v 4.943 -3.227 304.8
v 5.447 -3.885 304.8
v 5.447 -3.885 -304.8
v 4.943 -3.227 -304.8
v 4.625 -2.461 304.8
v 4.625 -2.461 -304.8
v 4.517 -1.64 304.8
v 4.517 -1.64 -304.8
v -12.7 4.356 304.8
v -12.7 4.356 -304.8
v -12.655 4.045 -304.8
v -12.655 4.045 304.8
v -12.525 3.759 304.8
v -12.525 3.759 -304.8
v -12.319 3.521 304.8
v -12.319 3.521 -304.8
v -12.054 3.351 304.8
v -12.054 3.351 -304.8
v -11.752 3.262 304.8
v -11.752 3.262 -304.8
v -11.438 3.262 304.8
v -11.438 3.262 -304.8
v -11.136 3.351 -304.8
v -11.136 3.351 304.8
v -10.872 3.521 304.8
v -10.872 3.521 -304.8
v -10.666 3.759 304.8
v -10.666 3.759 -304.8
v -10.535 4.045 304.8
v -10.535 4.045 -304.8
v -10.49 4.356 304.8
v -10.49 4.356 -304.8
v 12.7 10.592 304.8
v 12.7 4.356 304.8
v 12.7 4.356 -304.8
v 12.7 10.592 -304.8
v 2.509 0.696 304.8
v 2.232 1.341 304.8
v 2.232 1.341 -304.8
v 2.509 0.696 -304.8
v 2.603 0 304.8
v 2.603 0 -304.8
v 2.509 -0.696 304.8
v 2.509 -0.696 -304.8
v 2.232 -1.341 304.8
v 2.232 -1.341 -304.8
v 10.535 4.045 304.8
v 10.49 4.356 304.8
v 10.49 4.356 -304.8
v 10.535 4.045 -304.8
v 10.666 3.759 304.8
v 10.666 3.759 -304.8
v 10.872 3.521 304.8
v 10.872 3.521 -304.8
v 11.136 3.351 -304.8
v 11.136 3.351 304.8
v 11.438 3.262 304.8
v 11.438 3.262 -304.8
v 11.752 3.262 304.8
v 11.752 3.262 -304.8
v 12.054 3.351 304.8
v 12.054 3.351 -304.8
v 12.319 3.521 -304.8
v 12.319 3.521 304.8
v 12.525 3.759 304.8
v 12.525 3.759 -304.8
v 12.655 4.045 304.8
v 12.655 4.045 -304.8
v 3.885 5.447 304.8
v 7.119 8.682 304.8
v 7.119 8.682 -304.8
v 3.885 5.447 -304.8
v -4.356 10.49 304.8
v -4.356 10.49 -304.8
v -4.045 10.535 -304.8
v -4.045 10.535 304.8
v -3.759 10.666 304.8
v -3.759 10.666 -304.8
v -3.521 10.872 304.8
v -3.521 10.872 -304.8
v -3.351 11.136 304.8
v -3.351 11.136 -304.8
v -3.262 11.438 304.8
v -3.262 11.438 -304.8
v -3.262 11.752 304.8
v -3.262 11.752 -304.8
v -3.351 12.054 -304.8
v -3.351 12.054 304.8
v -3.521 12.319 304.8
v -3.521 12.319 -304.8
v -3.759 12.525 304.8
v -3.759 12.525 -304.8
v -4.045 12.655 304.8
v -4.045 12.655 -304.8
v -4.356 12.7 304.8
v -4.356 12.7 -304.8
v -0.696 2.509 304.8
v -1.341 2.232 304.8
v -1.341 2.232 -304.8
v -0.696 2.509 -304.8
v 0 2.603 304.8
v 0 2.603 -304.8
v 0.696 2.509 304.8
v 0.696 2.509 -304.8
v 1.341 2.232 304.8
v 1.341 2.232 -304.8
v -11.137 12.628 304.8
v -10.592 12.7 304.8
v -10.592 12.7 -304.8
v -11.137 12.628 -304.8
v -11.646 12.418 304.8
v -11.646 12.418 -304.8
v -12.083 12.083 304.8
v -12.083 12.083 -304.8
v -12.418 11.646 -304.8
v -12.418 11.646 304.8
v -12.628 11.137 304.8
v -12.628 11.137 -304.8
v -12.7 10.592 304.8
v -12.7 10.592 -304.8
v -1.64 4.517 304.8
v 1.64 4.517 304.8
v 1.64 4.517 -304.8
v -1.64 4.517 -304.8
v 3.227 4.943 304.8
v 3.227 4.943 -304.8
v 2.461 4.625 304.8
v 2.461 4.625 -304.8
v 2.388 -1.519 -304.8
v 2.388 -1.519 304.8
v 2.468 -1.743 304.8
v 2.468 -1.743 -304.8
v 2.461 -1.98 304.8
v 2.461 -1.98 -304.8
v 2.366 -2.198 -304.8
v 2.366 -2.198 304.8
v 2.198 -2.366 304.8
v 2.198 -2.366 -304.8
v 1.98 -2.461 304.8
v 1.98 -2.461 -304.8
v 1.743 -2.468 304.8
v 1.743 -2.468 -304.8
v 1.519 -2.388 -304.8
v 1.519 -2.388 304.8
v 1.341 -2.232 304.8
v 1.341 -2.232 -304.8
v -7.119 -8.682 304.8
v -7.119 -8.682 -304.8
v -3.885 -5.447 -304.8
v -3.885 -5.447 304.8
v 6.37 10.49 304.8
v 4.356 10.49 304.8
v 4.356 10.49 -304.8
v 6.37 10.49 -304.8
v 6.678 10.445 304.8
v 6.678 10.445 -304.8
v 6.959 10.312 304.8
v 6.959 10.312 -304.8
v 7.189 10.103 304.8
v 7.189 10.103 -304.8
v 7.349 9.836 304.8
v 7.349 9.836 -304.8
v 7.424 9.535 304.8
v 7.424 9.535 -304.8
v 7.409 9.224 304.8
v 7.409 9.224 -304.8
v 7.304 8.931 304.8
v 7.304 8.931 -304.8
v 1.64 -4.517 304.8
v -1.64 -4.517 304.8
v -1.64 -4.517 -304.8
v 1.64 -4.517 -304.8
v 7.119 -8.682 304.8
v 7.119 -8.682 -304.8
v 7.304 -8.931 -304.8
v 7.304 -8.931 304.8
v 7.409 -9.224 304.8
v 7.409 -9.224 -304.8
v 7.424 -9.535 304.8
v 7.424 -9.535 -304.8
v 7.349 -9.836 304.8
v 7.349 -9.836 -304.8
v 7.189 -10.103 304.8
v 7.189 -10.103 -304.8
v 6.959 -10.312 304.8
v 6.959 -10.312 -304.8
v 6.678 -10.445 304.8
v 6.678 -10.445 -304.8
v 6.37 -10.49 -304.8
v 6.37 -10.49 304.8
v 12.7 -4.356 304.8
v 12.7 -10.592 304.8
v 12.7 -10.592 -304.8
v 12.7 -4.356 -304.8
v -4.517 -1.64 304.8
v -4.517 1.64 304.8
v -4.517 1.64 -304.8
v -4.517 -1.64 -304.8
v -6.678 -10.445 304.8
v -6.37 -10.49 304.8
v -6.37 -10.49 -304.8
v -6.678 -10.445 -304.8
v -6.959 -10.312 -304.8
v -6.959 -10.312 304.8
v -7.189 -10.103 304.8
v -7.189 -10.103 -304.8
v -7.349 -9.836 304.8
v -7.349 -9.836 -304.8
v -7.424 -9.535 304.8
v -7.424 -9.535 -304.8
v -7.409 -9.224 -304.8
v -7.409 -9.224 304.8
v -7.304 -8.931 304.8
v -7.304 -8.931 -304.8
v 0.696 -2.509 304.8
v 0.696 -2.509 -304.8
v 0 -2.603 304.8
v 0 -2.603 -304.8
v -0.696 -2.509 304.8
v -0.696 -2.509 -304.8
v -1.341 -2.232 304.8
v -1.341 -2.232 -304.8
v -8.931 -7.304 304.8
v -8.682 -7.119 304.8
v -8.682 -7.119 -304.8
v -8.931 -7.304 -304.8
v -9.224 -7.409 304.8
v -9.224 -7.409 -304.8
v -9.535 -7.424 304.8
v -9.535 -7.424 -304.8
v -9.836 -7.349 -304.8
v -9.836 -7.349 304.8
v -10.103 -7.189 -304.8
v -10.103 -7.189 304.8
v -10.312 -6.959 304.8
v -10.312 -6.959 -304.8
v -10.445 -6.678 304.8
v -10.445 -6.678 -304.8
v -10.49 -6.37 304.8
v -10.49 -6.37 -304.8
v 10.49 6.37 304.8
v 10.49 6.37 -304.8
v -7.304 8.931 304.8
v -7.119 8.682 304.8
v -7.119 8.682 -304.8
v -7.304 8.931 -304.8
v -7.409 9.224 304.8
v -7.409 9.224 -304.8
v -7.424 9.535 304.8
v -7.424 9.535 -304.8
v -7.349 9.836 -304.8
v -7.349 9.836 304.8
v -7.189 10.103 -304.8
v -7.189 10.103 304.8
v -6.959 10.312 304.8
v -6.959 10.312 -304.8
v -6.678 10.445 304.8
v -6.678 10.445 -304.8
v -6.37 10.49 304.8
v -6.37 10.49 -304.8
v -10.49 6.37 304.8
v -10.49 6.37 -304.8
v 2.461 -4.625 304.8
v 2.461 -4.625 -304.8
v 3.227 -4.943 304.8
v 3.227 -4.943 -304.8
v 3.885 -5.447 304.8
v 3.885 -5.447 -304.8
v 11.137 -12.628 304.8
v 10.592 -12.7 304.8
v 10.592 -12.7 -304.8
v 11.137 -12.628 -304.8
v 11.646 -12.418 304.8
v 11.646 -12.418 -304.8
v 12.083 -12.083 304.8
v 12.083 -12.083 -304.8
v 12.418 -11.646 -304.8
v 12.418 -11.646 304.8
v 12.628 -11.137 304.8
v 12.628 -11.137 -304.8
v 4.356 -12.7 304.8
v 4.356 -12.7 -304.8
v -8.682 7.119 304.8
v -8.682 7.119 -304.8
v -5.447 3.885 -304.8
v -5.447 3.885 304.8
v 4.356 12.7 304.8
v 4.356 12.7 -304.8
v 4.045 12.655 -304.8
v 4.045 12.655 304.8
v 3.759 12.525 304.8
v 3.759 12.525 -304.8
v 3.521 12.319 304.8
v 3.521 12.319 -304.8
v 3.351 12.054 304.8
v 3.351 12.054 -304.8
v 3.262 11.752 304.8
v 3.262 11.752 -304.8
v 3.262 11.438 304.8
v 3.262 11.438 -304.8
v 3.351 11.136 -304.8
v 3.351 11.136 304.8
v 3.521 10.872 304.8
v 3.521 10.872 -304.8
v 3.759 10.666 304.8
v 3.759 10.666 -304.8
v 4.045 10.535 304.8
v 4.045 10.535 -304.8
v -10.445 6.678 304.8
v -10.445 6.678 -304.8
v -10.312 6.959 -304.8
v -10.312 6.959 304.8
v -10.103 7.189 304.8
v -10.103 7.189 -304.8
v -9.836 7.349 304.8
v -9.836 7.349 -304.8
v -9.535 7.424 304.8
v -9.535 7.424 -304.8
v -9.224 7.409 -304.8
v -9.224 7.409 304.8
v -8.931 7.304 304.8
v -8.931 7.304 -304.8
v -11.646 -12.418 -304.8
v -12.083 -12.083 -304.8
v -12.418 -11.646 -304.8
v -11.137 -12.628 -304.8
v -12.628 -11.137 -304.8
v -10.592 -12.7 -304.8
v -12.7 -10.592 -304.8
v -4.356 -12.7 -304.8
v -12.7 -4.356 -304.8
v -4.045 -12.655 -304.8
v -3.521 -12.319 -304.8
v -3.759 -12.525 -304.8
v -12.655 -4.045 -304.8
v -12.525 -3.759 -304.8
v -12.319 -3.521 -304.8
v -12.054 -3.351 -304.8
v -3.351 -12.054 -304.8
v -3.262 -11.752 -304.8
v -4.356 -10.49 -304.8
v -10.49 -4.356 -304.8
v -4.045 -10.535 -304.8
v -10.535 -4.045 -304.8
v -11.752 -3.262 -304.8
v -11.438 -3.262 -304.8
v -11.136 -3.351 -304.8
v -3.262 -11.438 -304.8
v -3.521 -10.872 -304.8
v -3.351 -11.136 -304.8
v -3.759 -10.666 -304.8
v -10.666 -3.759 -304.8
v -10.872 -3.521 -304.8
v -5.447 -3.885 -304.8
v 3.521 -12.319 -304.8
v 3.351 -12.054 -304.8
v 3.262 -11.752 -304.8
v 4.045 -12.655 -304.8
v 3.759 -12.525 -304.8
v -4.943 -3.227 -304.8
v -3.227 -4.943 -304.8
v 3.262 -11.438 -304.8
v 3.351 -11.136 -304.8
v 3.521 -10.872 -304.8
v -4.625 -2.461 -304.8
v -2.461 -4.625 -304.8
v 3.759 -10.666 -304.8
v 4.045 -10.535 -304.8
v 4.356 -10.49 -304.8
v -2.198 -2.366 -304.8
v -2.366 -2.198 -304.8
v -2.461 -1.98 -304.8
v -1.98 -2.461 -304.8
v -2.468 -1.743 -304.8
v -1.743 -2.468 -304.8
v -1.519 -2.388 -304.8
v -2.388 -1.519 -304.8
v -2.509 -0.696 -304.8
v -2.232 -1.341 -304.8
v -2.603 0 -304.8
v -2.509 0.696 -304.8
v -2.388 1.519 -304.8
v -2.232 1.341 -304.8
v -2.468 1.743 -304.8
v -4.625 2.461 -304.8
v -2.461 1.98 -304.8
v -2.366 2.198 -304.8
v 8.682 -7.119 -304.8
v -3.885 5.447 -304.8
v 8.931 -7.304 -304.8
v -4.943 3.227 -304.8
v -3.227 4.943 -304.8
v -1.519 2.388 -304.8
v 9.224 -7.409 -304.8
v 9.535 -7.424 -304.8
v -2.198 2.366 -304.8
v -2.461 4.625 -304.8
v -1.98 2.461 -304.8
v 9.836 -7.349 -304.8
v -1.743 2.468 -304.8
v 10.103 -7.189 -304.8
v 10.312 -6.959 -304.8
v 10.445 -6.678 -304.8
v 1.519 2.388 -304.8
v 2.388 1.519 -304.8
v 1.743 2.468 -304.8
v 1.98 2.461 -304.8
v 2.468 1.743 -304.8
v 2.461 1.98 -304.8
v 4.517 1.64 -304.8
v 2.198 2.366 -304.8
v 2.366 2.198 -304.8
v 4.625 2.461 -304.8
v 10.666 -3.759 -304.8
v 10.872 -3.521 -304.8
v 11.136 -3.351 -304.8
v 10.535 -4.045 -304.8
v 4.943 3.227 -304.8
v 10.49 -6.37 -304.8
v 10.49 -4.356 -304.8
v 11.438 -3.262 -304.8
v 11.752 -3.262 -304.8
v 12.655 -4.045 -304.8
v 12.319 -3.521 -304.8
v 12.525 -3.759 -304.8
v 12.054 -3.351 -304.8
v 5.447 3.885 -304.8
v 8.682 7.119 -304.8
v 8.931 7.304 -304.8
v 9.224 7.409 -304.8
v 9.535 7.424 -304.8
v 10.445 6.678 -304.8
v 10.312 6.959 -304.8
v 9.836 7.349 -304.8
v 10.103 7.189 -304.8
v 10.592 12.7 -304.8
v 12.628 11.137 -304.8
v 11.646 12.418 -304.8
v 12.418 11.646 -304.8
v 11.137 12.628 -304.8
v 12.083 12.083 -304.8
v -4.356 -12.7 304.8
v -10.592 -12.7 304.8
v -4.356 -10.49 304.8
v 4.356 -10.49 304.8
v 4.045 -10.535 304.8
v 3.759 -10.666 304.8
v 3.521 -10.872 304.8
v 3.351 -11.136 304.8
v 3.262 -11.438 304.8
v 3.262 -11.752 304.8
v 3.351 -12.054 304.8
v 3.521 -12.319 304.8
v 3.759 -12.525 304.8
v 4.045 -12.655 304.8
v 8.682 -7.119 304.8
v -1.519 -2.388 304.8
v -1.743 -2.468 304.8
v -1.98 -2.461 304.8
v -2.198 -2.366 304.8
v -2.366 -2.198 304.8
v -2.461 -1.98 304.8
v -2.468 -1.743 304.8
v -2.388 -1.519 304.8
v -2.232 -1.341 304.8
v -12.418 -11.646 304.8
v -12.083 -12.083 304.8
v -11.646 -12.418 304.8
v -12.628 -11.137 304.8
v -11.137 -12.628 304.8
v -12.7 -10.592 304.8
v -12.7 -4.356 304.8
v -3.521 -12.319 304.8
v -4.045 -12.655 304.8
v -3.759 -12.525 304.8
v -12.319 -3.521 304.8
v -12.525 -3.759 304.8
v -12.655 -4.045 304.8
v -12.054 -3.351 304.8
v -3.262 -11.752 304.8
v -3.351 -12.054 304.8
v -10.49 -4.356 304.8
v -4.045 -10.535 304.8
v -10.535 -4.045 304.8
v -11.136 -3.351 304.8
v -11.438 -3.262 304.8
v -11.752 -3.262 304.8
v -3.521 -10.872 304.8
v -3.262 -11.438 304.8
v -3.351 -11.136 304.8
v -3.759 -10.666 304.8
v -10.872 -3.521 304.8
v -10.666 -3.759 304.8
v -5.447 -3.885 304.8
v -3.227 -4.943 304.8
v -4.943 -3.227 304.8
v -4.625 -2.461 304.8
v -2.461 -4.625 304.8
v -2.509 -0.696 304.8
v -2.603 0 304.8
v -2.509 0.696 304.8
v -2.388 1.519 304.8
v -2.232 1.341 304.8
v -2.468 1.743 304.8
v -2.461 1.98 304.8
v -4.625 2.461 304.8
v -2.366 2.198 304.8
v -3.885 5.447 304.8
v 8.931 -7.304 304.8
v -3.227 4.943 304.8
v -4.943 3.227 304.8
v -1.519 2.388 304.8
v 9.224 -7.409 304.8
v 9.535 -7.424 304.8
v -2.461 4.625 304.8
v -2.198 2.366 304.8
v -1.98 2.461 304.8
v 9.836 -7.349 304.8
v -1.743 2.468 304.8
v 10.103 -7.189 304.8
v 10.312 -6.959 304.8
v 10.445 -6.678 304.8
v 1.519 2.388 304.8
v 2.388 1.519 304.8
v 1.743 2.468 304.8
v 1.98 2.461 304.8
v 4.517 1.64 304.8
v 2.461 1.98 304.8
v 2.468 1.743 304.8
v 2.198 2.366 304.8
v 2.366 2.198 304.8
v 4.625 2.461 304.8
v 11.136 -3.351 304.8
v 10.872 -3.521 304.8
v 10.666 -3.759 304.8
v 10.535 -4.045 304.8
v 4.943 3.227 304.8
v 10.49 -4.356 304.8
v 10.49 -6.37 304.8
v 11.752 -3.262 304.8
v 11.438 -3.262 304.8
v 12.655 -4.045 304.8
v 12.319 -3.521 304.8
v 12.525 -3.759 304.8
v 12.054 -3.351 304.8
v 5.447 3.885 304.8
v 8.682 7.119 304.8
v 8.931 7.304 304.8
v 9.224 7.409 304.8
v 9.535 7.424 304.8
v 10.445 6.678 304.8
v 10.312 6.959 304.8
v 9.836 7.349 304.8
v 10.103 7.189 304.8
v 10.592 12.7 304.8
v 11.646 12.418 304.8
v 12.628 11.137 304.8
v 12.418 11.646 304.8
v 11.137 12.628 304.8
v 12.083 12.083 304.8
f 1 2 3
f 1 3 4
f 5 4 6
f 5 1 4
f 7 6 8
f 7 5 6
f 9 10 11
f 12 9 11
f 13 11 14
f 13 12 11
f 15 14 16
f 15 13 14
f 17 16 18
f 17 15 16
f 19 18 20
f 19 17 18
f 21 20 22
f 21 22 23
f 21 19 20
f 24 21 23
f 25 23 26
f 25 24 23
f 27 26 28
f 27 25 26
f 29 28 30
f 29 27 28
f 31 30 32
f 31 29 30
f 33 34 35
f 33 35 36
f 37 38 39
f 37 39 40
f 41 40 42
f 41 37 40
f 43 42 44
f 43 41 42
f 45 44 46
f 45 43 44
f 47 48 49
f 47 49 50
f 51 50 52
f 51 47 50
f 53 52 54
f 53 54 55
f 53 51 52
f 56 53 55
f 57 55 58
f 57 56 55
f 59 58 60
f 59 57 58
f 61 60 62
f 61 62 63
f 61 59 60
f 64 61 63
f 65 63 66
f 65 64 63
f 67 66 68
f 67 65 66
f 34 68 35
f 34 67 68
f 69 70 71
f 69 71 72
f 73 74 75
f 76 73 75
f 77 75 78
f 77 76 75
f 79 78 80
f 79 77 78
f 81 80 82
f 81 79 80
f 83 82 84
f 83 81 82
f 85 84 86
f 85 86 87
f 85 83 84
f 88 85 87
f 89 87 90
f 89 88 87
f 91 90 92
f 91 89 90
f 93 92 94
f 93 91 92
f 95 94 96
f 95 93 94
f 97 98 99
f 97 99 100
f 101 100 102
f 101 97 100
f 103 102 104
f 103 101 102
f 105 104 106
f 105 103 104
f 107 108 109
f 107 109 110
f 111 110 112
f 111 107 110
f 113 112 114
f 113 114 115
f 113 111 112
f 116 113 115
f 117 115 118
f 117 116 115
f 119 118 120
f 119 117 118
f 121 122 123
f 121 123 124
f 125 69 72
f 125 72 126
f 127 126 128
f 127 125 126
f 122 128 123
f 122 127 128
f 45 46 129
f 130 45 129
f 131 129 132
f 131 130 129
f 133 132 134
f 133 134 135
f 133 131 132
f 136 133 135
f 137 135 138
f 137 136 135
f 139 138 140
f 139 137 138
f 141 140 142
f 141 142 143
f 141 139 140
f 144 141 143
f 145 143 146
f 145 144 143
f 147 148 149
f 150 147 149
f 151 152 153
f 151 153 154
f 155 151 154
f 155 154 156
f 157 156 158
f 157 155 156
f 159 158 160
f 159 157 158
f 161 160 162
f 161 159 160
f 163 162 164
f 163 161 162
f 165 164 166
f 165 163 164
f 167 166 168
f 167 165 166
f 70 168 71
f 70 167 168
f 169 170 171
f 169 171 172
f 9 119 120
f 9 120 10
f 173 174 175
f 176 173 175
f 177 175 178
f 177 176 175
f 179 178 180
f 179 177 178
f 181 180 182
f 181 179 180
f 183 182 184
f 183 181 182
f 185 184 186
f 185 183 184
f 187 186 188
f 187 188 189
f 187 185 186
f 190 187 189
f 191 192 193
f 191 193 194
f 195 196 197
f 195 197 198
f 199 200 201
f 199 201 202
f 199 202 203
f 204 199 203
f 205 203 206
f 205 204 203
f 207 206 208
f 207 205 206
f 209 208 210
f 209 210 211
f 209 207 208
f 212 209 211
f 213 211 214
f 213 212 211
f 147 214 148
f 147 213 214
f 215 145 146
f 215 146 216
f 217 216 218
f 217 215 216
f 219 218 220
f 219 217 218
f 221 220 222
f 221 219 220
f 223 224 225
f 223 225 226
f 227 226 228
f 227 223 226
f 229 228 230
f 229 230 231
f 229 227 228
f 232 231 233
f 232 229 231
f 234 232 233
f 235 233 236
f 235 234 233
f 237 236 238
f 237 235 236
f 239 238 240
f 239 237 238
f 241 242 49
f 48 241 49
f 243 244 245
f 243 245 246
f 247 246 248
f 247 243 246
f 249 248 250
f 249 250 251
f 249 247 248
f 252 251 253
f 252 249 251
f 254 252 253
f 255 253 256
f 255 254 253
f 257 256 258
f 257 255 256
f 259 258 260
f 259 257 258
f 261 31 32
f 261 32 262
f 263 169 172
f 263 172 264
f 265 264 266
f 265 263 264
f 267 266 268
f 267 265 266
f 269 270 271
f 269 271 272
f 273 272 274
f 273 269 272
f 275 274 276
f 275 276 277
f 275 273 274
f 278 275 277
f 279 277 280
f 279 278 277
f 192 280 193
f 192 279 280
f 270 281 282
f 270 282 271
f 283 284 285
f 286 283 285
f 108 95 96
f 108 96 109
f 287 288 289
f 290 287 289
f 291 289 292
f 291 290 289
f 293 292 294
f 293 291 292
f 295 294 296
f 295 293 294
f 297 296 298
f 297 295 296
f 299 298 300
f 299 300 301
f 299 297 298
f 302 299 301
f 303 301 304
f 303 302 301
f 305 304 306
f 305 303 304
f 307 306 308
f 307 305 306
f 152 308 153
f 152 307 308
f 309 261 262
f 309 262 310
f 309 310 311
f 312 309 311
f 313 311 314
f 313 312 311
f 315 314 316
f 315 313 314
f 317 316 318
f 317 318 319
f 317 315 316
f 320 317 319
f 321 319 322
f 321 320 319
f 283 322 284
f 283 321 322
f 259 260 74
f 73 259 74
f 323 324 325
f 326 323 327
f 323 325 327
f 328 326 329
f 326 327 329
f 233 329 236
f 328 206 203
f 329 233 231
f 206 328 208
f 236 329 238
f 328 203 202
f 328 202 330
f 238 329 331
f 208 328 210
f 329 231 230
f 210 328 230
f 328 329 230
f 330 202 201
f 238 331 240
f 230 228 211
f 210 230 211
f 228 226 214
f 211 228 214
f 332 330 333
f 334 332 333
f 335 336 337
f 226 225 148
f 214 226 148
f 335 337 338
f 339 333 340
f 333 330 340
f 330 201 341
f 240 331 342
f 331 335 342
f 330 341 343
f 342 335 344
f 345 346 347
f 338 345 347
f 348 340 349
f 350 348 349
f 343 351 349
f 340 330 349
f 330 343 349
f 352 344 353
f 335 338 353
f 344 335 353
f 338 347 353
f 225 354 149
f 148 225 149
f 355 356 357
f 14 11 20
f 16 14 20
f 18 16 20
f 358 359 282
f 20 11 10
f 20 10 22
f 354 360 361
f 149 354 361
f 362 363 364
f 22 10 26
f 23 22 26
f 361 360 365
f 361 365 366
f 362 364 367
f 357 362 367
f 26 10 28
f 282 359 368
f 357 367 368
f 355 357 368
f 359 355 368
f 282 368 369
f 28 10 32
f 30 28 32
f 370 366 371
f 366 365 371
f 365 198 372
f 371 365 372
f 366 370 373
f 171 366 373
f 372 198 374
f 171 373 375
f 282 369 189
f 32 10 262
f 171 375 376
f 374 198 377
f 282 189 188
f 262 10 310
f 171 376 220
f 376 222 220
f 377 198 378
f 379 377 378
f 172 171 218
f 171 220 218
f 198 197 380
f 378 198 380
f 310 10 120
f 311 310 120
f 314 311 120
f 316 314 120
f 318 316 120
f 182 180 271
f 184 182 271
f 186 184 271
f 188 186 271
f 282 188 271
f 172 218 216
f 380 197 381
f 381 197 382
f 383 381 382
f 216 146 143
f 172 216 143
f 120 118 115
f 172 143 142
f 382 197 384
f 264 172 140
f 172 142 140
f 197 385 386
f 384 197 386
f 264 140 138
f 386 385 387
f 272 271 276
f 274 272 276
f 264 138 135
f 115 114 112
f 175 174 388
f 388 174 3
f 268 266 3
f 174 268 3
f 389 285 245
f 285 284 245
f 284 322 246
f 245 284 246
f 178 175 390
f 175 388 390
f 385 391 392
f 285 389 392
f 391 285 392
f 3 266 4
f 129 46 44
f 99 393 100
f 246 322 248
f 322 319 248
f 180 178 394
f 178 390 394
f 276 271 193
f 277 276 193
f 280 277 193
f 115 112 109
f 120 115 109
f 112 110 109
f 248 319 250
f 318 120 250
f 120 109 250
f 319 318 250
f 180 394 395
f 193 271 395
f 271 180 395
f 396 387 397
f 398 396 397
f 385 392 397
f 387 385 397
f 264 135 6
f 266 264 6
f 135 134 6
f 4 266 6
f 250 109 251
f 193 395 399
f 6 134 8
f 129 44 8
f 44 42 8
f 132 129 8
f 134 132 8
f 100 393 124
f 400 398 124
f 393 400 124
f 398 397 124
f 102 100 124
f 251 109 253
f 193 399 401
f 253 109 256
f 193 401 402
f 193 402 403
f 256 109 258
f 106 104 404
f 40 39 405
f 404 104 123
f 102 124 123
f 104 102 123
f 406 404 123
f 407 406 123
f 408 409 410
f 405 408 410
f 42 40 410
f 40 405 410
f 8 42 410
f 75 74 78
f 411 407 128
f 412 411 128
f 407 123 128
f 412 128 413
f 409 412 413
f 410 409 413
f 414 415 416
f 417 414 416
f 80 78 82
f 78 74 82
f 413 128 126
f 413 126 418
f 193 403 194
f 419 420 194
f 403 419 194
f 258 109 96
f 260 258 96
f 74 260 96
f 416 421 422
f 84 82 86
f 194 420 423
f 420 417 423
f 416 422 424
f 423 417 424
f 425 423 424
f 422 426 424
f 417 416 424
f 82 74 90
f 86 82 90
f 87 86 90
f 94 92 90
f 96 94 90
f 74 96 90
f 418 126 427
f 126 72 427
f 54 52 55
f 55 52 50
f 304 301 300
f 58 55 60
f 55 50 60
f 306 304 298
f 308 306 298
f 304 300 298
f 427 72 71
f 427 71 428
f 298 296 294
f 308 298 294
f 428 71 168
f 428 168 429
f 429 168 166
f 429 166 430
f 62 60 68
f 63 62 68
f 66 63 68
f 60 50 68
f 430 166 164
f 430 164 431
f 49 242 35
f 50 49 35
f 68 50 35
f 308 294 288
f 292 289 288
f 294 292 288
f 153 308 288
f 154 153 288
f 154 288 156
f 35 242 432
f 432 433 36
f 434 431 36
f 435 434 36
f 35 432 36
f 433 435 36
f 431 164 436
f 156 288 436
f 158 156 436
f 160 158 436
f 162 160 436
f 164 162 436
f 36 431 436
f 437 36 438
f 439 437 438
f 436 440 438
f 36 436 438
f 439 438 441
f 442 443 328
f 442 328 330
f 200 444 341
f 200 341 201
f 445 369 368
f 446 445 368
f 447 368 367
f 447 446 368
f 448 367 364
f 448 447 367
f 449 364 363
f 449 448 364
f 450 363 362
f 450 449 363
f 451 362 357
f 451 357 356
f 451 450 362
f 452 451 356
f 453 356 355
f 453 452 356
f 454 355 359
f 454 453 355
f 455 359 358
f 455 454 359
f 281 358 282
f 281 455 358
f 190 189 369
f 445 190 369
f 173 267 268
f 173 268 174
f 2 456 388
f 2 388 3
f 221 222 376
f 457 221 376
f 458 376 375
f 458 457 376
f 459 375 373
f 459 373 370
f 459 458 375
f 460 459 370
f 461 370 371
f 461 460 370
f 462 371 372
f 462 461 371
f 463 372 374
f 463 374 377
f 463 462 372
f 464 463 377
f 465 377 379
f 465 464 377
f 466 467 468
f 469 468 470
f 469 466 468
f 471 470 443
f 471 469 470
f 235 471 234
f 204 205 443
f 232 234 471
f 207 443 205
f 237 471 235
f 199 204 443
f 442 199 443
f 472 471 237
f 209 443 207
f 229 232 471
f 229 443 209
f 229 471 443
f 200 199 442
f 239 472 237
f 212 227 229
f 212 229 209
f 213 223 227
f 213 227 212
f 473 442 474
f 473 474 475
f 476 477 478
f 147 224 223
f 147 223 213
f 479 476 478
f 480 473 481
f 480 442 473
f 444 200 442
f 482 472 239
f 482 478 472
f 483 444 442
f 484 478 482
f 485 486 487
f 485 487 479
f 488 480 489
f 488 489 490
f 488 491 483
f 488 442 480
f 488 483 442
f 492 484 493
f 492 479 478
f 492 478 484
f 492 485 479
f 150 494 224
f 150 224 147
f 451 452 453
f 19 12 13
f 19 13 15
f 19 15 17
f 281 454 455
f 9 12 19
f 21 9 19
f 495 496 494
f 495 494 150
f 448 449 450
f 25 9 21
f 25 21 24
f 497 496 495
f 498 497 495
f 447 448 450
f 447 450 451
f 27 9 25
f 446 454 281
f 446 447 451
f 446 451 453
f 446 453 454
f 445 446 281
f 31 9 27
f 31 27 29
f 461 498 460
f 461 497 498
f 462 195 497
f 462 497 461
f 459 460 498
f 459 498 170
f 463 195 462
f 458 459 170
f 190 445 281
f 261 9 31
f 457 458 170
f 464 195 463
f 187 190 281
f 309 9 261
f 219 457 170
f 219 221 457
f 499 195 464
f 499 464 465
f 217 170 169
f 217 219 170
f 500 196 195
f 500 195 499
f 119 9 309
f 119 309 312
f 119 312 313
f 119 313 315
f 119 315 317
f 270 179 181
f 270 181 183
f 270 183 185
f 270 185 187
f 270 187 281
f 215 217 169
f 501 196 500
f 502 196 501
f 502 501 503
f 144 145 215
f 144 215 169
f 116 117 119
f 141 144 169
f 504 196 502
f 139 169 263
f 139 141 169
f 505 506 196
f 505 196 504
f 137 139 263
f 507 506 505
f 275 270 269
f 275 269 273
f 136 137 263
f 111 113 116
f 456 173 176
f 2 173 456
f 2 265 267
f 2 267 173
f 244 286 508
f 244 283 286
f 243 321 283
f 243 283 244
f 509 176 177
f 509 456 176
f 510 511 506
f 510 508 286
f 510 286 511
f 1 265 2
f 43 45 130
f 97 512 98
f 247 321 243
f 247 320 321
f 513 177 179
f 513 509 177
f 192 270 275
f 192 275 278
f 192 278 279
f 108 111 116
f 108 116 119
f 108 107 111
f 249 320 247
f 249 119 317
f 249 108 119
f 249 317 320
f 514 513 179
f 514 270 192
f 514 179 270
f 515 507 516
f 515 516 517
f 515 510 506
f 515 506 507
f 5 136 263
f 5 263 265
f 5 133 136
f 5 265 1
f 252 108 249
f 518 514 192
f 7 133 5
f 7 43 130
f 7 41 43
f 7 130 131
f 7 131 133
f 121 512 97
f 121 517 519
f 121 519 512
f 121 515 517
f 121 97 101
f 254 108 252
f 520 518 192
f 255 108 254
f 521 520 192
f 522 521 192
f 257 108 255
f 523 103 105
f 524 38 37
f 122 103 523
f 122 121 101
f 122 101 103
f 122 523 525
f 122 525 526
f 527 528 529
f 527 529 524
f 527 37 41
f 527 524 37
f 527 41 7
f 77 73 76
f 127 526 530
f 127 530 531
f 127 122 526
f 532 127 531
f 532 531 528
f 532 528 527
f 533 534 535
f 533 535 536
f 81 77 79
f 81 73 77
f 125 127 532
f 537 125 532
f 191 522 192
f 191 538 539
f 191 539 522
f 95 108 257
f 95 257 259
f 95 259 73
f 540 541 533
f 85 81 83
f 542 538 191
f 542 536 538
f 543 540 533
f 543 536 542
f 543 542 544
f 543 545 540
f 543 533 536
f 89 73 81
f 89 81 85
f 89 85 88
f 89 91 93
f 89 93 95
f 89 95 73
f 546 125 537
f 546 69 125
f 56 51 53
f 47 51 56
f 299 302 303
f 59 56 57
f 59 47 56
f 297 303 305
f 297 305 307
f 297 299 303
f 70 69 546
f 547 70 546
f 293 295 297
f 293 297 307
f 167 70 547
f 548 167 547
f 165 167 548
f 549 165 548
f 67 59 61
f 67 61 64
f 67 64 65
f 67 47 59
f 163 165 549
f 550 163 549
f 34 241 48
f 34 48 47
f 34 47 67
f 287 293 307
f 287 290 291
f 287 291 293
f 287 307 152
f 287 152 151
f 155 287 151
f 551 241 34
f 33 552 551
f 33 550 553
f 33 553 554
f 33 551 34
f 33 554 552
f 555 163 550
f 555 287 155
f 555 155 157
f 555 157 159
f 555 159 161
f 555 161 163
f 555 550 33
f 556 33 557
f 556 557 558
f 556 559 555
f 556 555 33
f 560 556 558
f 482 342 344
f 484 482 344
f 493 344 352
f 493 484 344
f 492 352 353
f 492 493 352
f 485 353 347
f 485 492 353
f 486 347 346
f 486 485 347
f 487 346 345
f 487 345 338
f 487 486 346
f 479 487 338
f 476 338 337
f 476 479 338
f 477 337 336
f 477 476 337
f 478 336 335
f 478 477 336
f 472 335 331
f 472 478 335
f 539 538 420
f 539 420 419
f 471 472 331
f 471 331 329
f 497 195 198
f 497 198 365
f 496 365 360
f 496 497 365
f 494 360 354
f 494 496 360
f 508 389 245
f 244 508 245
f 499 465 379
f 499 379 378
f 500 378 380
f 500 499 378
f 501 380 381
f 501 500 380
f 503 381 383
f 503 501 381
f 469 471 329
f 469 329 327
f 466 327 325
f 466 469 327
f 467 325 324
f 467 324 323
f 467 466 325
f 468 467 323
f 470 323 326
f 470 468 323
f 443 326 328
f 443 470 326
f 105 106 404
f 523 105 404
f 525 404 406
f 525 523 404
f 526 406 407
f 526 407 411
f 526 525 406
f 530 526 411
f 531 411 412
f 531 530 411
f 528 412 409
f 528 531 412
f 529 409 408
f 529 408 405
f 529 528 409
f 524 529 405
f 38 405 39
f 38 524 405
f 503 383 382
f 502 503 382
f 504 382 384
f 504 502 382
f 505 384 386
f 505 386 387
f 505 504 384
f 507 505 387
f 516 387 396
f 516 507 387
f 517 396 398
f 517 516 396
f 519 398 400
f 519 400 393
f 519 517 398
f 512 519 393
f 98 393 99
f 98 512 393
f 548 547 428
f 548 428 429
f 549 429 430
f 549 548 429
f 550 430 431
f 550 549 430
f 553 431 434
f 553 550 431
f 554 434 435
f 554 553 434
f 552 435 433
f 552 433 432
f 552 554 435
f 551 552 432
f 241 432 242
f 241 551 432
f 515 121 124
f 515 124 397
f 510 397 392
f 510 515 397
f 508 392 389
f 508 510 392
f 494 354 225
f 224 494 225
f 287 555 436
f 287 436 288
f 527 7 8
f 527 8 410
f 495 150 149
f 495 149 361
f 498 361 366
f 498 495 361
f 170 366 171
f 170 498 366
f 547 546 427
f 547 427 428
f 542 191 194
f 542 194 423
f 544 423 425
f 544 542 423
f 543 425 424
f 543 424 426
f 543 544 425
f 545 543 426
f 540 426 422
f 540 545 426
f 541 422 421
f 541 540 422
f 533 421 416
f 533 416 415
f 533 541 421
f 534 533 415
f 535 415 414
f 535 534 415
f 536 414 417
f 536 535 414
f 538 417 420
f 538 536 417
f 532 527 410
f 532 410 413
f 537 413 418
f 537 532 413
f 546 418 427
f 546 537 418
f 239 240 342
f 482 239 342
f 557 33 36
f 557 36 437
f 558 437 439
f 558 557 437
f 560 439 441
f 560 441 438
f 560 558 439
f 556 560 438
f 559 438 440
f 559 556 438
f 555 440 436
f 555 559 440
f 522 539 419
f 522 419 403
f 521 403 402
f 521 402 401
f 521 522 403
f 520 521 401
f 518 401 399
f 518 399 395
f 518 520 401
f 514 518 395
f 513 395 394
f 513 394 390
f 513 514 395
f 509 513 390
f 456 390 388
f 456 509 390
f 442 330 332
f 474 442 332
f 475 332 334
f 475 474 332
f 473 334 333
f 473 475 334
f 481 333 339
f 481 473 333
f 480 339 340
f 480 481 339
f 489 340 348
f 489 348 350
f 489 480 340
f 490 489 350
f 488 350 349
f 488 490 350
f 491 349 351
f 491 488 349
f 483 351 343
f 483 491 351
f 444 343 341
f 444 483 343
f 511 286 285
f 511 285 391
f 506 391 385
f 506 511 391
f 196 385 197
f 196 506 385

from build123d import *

# Parameters (mm, degrees)
BOSS_EXTRUDE1_DEPTH = 609.6


with BuildPart() as part:
    # Sketch1 → Boss-Extrude1 (new body)
    with BuildSketch(Plane.XY.offset(304.8)):
        with BuildLine():
            Line((-12.7, -4.356099789), (-12.7, -10.5918))
            ThreePointArc((-12.7, -10.5918), (-12.082522516, -12.082522516), (-10.5918, -12.7))
            Line((-10.5918, -12.7), (-4.3561, -12.7))
            ThreePointArc((-4.3561, -12.7), (-3.2512, -11.5951), (-4.3561, -10.4902))
            Line((-4.3561, -10.4902), (-6.370083784, -10.4902))
            ThreePointArc((-6.370083784, -10.4902), (-7.348856741, -9.836204819), (-7.119204173, -8.681663396))
            Line((-7.119204173, -8.681663396), (-3.884643889, -5.447103112))
            ThreePointArc((-3.884643889, -5.447103112), (-2.854599756, -4.758849626), (-1.639579858, -4.517167142))
            Line((-1.639579858, -4.517167142), (1.639579858, -4.517167142))
            ThreePointArc((1.639579858, -4.517167142), (2.854599756, -4.758849626), (3.884643889, -5.447103112))
            Line((3.884643889, -5.447103112), (7.119204173, -8.681663397))
            ThreePointArc((7.119204173, -8.681663397), (7.348856741, -9.836204819), (6.370083784, -10.4902))
            Line((6.370083784, -10.4902), (4.356099789, -10.4902))
            ThreePointArc((4.356099789, -10.4902), (3.251199789, -11.5951), (4.356099789, -12.7))
            Line((4.356099789, -12.7), (10.5918, -12.7))
            ThreePointArc((10.5918, -12.7), (12.082522516, -12.082522516), (12.7, -10.5918))
            Line((12.7, -10.5918), (12.7, -4.356100001))
            ThreePointArc((12.7, -4.356100001), (11.5951, -3.251200001), (10.490200001, -4.356100001))
            Line((10.490200001, -4.356100001), (10.490200001, -6.370083785))
            ThreePointArc((10.490200001, -6.370083785), (9.836204819, -7.348856741), (8.681663397, -7.119204174))
            Line((8.681663397, -7.119204174), (5.447103112, -3.884643889))
            ThreePointArc((5.447103112, -3.884643889), (4.758849627, -2.854599757), (4.517167143, -1.639579859))
            Line((4.517167143, -1.639579859), (4.517167143, 1.639579859))
            ThreePointArc((4.517167143, 1.639579859), (4.758849627, 2.854599757), (5.447103112, 3.884643889))
            Line((5.447103112, 3.884643889), (8.681663397, 7.119204174))
            ThreePointArc((8.681663397, 7.119204174), (9.836204819, 7.348856741), (10.490200001, 6.370083784))
            Line((10.490200001, 6.370083784), (10.490200001, 4.356099789))
            ThreePointArc((10.490200001, 4.356099789), (11.5951, 3.251199789), (12.7, 4.356099789))
            Line((12.7, 4.356099789), (12.7, 10.5918))
            ThreePointArc((12.7, 10.5918), (12.082522516, 12.082522516), (10.5918, 12.7))
            Line((10.5918, 12.7), (4.3561, 12.7))
            ThreePointArc((4.3561, 12.7), (3.2512, 11.5951), (4.3561, 10.4902))
            Line((4.3561, 10.4902), (6.370083784, 10.4902))
            ThreePointArc((6.370083784, 10.4902), (7.348856741, 9.836204819), (7.119204173, 8.681663397))
            Line((7.119204173, 8.681663397), (3.884643889, 5.447103112))
            ThreePointArc((3.884643889, 5.447103112), (2.854599756, 4.758849626), (1.639579858, 4.517167142))
            Line((1.639579858, 4.517167142), (-1.639579858, 4.517167142))
            ThreePointArc((-1.639579858, 4.517167142), (-2.854599756, 4.758849626), (-3.884643889, 5.447103112))
            Line((-3.884643889, 5.447103112), (-7.119204173, 8.681663396))
            ThreePointArc((-7.119204173, 8.681663396), (-7.348856741, 9.836204819), (-6.370083784, 10.4902))
            Line((-6.370083784, 10.4902), (-4.356099789, 10.4902))
            ThreePointArc((-4.356099789, 10.4902), (-3.251199789, 11.5951), (-4.356099789, 12.7))
            Line((-4.356099789, 12.7), (-10.5918, 12.7))
            ThreePointArc((-10.5918, 12.7), (-12.082522516, 12.082522516), (-12.7, 10.5918))
            Line((-12.7, 10.5918), (-12.7, 4.3561))
            ThreePointArc((-12.7, 4.3561), (-11.5951, 3.2512), (-10.4902, 4.3561))
            Line((-10.4902, 4.3561), (-10.4902, 6.370083784))
            ThreePointArc((-10.4902, 6.370083784), (-9.836204819, 7.348856741), (-8.681663396, 7.119204173))
            Line((-8.681663396, 7.119204173), (-5.447103112, 3.884643889))
            ThreePointArc((-5.447103112, 3.884643889), (-4.758849626, 2.854599756), (-4.517167142, 1.639579858))
            Line((-4.517167142, 1.639579858), (-4.517167142, -1.639579858))
            ThreePointArc((-4.517167142, -1.639579858), (-4.758849626, -2.854599756), (-5.447103112, -3.884643889))
            Line((-5.447103112, -3.884643889), (-8.681663396, -7.119204173))
            ThreePointArc((-8.681663396, -7.119204173), (-9.836204819, -7.348856741), (-10.4902, -6.370083784))
            Line((-10.4902, -6.370083784), (-10.4902, -4.356099789))
            ThreePointArc((-10.4902, -4.356099789), (-11.5951, -3.251199789), (-12.7, -4.356099789))
        make_face()
        with BuildLine():
            ThreePointArc((-2.231856263, 1.340533428), (-2.289965312, 2.289965312), (-1.340533428, 2.231856263))
            ThreePointArc((-1.340533428, 2.231856263), (0, 2.6035), (1.340533428, 2.231856263))
            ThreePointArc((1.340533428, 2.231856263), (2.289965312, 2.289965312), (2.231856263, 1.340533428))
            ThreePointArc((2.231856263, 1.340533428), (2.6035, 0), (2.231856263, -1.340533428))
            ThreePointArc((2.231856263, -1.340533428), (2.289965312, -2.289965312), (1.340533428, -2.231856263))
            ThreePointArc((1.340533428, -2.231856263), (0, -2.6035), (-1.340533428, -2.231856263))
            ThreePointArc((-1.340533428, -2.231856263), (-2.289965312, -2.289965312), (-2.231856263, -1.340533428))
            ThreePointArc((-2.231856263, -1.340533428), (-2.6035, 0), (-2.231856263, 1.340533428))
        make_face(mode=Mode.SUBTRACT)
    extrude(amount=-BOSS_EXTRUDE1_DEPTH)


solid = part.part
